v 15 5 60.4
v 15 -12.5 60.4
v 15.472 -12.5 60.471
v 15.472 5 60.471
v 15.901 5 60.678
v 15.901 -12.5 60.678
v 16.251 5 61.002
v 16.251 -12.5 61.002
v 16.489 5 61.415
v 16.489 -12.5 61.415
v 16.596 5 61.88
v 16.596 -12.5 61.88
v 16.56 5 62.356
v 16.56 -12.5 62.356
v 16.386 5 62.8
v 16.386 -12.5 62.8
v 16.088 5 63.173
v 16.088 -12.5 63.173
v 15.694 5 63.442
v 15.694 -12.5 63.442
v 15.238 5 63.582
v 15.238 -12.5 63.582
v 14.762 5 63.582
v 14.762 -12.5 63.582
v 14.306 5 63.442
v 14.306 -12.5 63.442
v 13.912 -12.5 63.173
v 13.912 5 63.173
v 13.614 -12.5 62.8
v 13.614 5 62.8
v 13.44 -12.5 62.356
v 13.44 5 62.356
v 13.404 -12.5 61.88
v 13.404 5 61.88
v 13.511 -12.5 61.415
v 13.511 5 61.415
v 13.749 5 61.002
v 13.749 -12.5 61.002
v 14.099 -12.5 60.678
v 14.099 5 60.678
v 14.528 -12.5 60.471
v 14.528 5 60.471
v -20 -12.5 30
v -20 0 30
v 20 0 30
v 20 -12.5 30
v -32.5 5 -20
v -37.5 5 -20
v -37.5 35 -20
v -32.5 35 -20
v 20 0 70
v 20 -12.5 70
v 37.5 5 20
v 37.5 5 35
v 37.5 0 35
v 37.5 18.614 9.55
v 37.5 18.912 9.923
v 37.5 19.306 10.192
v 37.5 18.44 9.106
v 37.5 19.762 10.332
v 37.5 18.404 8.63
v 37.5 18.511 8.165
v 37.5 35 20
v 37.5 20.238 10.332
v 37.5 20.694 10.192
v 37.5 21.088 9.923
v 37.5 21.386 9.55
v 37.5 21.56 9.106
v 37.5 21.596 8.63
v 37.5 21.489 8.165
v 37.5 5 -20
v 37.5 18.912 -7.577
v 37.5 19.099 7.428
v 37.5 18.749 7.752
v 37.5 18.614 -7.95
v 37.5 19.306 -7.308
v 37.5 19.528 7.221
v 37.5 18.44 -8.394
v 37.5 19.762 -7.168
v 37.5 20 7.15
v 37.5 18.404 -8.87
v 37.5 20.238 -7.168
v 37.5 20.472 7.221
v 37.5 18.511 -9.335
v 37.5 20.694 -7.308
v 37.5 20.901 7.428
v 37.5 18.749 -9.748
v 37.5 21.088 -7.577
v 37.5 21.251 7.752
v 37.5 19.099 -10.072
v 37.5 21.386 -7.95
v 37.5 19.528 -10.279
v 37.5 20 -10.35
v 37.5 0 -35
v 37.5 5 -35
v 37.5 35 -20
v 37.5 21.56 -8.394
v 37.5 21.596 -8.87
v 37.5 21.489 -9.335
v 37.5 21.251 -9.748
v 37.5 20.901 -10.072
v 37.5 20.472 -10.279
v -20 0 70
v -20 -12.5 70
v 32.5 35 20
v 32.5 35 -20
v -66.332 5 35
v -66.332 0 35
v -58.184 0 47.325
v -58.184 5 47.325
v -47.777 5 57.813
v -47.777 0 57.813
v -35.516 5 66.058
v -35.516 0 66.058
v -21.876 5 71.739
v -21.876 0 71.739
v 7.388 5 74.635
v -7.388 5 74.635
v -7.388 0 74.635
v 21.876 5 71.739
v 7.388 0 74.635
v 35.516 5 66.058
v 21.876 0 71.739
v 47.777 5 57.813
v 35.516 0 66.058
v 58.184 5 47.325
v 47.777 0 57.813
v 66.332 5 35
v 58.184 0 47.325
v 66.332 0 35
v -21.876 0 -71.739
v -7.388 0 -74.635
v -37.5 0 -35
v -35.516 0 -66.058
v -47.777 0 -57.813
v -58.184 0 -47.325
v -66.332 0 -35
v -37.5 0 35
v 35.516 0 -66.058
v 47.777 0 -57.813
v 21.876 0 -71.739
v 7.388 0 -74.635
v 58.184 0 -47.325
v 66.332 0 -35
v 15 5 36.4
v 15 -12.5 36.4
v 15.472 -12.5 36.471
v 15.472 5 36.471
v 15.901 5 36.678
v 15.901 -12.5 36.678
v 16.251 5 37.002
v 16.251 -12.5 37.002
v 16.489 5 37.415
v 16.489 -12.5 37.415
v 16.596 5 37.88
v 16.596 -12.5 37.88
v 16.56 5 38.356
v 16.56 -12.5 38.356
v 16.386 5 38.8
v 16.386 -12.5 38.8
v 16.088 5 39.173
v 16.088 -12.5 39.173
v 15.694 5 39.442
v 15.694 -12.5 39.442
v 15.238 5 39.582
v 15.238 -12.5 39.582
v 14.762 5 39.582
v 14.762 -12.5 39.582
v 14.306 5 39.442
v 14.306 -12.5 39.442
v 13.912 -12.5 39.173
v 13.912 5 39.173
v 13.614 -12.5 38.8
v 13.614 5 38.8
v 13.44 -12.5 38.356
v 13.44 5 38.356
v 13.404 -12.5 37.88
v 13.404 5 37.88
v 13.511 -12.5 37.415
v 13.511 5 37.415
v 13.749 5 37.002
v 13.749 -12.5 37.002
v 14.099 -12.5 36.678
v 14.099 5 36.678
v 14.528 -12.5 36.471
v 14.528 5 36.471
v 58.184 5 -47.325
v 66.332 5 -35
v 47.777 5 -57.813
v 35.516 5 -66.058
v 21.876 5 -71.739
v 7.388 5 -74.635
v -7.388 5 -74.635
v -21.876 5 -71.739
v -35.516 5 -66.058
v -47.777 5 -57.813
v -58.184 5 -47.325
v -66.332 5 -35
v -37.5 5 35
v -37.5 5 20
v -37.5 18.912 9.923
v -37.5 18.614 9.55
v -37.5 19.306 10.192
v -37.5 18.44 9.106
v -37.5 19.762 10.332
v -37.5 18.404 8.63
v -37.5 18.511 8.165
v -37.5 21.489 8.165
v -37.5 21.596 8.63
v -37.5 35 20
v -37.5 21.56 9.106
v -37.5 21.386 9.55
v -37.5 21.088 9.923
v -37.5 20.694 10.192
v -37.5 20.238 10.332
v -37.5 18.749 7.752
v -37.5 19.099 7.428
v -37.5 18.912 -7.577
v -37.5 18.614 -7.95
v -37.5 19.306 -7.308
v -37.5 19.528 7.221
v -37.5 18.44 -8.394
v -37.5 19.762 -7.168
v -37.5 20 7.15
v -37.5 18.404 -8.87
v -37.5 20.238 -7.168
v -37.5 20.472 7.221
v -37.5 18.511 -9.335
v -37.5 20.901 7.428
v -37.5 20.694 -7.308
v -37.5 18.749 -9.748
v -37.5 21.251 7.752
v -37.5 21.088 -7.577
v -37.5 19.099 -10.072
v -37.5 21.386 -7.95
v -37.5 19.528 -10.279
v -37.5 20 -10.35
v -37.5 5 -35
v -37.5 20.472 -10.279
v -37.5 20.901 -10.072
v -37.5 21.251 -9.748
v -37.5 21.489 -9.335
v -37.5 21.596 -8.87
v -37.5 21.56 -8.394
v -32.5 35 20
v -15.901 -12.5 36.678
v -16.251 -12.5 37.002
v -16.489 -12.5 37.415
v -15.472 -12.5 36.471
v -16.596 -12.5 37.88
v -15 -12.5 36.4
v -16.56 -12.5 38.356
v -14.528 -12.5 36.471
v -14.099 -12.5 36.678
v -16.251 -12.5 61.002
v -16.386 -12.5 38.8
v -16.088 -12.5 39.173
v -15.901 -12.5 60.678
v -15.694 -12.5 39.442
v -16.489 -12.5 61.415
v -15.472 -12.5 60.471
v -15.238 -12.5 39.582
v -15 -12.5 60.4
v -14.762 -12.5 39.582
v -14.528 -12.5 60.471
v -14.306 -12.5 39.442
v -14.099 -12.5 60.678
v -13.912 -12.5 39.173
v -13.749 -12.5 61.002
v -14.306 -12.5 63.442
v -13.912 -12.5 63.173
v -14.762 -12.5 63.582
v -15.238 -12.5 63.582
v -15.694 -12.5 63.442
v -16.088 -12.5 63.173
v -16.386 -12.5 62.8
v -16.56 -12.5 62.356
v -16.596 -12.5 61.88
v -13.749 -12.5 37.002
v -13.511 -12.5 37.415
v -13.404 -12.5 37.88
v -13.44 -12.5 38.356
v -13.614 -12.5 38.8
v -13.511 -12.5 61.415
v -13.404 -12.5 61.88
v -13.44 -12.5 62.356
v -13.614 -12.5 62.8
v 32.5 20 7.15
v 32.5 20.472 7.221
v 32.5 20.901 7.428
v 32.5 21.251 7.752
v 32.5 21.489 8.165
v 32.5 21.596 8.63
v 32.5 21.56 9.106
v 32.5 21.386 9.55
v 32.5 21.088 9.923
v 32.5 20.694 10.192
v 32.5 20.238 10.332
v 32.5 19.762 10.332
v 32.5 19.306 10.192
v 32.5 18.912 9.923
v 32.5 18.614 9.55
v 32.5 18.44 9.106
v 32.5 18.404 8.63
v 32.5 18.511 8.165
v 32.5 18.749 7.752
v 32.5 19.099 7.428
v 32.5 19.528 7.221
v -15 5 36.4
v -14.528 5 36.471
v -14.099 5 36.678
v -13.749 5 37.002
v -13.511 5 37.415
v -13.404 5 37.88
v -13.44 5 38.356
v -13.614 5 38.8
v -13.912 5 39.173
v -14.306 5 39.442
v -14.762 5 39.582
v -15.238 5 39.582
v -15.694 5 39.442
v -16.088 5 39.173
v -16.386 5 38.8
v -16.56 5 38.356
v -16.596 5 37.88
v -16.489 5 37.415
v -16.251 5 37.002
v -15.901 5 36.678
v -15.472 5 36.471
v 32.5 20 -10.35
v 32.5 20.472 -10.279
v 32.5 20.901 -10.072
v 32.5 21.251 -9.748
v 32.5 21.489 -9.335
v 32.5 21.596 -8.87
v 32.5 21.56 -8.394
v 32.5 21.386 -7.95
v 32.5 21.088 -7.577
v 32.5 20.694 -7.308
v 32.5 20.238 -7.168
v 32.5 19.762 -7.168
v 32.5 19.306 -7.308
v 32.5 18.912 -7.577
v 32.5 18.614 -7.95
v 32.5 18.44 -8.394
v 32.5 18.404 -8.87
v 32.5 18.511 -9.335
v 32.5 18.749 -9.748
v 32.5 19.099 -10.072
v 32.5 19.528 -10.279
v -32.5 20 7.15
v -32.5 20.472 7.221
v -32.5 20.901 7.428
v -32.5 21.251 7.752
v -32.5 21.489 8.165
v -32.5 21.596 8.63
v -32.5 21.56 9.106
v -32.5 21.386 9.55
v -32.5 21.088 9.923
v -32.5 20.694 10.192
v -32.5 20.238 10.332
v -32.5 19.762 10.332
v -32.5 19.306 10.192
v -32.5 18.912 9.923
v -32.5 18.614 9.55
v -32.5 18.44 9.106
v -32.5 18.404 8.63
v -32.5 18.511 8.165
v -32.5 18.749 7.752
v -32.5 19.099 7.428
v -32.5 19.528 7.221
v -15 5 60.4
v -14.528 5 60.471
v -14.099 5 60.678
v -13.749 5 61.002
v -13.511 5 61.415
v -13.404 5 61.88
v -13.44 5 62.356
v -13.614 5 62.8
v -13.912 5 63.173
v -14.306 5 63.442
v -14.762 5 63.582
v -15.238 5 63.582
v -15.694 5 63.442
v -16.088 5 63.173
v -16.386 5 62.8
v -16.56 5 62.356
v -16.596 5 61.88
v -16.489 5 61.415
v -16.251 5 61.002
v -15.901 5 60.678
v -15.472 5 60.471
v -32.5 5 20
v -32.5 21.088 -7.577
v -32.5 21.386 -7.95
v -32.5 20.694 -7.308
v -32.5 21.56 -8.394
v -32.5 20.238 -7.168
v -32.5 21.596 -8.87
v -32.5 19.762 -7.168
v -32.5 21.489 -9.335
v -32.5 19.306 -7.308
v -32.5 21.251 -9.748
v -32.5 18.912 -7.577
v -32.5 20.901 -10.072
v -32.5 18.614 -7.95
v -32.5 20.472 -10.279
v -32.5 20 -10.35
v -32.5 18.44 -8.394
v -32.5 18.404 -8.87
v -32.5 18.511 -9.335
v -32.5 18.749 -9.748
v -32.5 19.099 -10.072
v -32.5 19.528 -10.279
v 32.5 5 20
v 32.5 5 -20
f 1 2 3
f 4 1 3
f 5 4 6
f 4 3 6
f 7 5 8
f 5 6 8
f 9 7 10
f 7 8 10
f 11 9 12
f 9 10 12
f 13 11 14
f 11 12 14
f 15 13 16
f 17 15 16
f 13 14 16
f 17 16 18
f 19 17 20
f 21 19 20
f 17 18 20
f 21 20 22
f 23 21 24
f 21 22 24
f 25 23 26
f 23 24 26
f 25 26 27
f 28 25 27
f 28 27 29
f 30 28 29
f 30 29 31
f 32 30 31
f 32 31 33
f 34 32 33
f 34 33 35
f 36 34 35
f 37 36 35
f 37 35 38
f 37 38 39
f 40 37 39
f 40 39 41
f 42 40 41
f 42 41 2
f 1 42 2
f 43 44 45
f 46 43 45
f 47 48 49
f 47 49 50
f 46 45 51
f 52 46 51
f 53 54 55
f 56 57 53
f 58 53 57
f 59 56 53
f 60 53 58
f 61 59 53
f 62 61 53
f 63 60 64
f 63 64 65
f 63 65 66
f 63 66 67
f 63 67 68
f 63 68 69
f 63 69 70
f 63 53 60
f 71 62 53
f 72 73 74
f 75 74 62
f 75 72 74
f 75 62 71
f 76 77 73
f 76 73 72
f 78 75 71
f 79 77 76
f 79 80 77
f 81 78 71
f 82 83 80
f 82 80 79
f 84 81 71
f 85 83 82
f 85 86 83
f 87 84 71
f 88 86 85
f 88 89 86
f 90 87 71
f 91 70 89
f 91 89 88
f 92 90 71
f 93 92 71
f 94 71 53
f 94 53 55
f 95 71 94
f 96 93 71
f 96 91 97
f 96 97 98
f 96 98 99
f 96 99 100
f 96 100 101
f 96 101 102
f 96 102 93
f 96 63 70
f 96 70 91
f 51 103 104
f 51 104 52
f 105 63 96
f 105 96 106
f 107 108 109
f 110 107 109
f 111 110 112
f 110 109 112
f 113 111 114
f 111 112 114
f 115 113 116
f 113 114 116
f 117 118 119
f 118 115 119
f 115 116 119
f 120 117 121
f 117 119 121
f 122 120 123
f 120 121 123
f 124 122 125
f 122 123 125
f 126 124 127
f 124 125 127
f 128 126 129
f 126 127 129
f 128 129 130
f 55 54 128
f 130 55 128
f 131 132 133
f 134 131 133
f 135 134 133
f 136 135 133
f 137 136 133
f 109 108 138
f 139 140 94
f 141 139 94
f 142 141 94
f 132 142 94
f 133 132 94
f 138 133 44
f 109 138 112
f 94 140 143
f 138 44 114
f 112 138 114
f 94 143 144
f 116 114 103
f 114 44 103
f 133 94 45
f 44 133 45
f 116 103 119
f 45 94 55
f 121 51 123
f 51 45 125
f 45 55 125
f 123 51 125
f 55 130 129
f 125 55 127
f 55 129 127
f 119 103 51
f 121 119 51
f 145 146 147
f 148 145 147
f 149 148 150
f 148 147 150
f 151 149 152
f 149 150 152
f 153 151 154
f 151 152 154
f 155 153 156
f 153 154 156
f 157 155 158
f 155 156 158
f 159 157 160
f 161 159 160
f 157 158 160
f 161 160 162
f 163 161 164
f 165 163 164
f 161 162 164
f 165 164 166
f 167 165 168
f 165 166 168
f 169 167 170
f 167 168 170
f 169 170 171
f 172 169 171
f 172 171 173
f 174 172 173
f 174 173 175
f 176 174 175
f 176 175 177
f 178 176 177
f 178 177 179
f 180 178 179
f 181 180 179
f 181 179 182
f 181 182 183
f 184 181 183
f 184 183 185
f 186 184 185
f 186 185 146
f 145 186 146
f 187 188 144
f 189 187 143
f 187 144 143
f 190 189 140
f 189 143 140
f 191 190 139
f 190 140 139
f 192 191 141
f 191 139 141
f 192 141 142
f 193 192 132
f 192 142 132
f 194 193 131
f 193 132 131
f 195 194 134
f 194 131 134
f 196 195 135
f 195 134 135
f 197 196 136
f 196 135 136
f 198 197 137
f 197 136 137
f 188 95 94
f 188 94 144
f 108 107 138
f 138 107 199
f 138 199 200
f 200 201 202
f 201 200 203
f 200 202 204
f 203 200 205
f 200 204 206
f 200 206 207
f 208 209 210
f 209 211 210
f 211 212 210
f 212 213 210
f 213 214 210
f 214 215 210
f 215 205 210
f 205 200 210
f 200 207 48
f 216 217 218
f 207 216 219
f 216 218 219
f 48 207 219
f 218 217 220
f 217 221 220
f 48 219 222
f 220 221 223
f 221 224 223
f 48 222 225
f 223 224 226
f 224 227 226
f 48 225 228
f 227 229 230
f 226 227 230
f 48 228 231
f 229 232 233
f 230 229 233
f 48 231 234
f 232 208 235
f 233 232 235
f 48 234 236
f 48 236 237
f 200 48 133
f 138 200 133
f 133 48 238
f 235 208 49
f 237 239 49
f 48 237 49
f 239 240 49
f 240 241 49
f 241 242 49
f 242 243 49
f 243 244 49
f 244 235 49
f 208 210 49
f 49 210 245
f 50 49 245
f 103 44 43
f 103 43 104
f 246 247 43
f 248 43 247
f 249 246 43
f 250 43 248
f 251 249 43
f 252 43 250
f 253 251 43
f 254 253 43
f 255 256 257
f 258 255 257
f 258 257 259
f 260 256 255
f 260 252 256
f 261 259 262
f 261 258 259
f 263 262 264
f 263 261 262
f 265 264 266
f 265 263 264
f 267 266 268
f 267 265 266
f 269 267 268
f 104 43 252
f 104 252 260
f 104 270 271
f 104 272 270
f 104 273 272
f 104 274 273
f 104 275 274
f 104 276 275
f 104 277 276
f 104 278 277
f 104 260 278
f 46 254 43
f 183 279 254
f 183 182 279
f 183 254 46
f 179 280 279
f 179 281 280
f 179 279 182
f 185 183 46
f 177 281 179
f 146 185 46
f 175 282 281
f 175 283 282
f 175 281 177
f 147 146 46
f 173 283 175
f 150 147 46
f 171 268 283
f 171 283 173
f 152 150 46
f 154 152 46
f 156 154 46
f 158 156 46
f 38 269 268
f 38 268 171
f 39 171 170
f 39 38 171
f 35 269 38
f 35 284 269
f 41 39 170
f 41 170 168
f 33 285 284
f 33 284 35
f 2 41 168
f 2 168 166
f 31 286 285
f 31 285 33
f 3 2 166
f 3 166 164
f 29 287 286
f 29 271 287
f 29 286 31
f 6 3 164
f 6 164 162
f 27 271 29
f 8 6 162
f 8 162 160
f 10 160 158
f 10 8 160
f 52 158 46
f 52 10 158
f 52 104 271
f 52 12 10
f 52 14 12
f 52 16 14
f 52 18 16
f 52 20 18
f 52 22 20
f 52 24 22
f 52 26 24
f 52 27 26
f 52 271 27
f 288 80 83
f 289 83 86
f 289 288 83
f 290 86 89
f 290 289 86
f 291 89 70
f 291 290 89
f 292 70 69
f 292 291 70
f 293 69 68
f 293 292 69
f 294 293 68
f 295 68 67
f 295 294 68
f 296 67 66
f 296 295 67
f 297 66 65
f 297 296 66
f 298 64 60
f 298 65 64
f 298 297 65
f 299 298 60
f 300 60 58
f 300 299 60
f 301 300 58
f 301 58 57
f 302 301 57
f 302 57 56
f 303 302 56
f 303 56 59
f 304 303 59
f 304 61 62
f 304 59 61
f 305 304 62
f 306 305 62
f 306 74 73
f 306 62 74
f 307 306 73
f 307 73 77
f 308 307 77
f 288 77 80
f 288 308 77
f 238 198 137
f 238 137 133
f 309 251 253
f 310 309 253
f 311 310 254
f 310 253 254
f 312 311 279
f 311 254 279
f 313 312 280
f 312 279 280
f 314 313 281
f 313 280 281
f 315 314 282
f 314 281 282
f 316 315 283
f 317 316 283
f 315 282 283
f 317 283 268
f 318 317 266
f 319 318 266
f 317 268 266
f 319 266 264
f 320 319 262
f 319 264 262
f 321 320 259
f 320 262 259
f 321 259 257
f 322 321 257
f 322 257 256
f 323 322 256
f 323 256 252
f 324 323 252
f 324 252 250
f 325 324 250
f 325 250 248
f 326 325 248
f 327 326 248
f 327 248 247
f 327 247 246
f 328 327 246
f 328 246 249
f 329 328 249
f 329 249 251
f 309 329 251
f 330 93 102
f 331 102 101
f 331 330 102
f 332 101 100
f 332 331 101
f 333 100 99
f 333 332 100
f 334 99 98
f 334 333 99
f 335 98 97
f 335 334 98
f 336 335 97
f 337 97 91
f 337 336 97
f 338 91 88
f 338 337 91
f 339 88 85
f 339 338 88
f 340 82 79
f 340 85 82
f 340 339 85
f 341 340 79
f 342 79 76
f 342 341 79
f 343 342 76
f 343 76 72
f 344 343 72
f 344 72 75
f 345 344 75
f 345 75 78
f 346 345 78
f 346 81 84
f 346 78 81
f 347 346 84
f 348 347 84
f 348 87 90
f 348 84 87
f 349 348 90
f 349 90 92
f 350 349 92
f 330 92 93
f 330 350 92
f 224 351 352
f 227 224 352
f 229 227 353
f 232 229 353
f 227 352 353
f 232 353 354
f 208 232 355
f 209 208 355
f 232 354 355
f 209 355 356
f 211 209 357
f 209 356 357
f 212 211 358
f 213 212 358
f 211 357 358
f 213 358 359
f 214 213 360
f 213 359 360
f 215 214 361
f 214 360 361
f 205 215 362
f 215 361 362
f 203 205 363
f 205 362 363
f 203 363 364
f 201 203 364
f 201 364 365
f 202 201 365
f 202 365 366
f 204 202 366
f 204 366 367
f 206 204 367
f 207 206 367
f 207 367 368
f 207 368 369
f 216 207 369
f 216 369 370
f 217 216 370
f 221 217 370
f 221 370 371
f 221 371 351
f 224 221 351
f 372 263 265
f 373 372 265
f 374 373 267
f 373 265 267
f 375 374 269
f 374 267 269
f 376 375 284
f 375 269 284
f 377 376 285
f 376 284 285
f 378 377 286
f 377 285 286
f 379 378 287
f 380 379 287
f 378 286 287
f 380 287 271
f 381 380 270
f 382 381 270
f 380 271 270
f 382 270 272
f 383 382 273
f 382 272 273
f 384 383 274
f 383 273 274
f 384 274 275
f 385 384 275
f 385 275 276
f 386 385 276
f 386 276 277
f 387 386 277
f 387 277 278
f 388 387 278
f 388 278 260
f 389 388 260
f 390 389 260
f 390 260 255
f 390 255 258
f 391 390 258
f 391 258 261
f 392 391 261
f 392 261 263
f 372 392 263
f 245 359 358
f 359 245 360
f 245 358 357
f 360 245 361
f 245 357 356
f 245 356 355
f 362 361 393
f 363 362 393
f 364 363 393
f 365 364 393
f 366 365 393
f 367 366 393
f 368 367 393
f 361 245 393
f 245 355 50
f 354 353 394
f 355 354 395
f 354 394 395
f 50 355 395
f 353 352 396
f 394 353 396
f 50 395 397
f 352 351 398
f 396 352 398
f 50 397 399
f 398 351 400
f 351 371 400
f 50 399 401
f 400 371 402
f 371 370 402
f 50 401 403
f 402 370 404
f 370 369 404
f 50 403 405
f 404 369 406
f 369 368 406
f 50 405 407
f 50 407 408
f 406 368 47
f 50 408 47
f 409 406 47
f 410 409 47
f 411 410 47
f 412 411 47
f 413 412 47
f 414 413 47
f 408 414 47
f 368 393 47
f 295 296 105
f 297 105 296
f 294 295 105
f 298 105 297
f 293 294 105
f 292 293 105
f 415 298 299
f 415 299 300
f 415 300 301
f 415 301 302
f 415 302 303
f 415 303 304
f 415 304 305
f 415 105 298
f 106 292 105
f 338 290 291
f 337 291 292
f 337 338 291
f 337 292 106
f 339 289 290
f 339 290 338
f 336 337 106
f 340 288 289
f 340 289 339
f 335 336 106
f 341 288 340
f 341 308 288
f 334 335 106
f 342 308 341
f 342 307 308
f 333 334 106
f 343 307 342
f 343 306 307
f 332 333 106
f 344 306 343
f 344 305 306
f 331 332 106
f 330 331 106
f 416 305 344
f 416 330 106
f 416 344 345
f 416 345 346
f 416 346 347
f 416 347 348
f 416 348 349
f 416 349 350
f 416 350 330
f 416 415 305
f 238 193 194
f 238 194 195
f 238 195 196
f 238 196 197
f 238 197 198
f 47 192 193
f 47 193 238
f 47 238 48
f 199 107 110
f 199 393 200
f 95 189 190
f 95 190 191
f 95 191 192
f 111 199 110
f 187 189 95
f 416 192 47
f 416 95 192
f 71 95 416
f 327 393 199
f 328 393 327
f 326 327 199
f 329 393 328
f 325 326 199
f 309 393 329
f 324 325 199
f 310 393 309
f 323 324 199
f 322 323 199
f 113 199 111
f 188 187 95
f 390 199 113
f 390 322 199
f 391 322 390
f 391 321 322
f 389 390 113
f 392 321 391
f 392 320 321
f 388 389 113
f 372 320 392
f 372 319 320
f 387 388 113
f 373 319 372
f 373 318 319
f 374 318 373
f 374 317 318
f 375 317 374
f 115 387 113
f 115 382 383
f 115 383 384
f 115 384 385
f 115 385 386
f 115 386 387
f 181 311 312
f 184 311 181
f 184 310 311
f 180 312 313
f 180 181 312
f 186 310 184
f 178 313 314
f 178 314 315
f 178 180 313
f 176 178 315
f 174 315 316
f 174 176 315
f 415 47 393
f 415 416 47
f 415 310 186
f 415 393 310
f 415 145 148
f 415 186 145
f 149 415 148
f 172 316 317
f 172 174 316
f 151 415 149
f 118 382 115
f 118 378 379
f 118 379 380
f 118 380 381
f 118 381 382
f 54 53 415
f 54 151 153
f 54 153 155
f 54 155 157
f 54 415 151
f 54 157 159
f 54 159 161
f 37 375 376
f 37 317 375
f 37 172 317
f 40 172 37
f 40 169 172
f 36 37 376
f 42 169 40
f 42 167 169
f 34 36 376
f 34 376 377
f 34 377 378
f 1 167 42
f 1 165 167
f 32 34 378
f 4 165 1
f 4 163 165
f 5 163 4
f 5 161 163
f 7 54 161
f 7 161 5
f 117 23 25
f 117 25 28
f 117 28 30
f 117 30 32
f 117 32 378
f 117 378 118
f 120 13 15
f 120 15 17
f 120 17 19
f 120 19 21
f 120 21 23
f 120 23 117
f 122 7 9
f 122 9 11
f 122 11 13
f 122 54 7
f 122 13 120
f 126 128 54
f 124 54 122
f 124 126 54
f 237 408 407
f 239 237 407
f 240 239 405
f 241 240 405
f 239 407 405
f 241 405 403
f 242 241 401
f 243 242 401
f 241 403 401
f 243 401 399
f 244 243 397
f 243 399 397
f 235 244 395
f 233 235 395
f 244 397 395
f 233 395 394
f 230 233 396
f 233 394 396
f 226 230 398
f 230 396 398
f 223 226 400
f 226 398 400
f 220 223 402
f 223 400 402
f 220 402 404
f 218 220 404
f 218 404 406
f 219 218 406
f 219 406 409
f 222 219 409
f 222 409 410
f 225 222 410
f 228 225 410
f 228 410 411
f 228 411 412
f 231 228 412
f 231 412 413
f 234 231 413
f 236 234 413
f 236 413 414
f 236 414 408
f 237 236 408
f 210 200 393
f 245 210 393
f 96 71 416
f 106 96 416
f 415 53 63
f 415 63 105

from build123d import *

# Parameters (mm, degrees)
SKETCH1_R           = 75
BOSS_EXTRUDE2_DEPTH = 5
SKETCH5_W           = 35
SKETCH5_H           = 70
CUT_EXTRUDE1_DEPTH  = 107.183802908
SKETCH6_W           = 5
SKETCH6_H           = 40
BOSS_EXTRUDE3_DEPTH = 30
SKETCH7_R           = 1.6
CUT_EXTRUDE2_DEPTH  = 136.669635512
SKETCH8_W           = 40
SKETCH8_H           = 40
BOSS_EXTRUDE5_DEPTH = 12.5
SKETCH9_R           = 1.6
CUT_EXTRUDE3_DEPTH  = 111.820801297


with BuildPart() as part:
    # Sketch1 → Boss-Extrude2 (new body)
    with BuildSketch(Plane(origin=(0, 0, 0), x_dir=(1, 0, 0), z_dir=(0, 1, 0))):
        with Locations(Location((0, 0, 0), (0, 0, 270))):
            Circle(SKETCH1_R)
    extrude(amount=BOSS_EXTRUDE2_DEPTH)

    # Sketch5 → Cut-Extrude1 (cut, through all)
    with BuildSketch(Plane(origin=(0, 5, 0), x_dir=(1, 0, 0), z_dir=(0, 1, 0))):
        with Locations((55, 0)):
            Rectangle(SKETCH5_W, SKETCH5_H)
        with Locations((-55, 0)):
            Rectangle(SKETCH5_W, SKETCH5_H)
    extrude(amount=-CUT_EXTRUDE1_DEPTH, mode=Mode.SUBTRACT)


with BuildPart() as cut_extrude1_piece_1:
    # of the separate pieces the step leaves, piece 1, a body of its own (cut_extrude1_pieces)
    add(part.part.solids().sort_by_distance((-66.332495807, 0, 35))[0])

    # Sketch6 → Boss-Extrude3 (add)
    with BuildSketch(Plane(origin=(0, 5, 0), x_dir=(1, 0, 0), z_dir=(0, 1, 0))):
        with Locations((-35, 0)):
            Rectangle(SKETCH6_W, SKETCH6_H)
    boss_extrude3 = extrude(amount=BOSS_EXTRUDE3_DEPTH)

    # Sketch7 → Cut-Extrude2 (cut, through all)
    with BuildSketch(Plane(origin=(-32.5, 0, 0), x_dir=(0, 0, -1), z_dir=(1, 0, 0))):
        with Locations((-8.75, 20)):
            Circle(SKETCH7_R)
        with Locations((8.75, 20)):
            Circle(SKETCH7_R)
    cut_extrude2 = extrude(amount=-CUT_EXTRUDE2_DEPTH, mode=Mode.SUBTRACT)

    # Mirror1: Boss-Extrude3, Cut-Extrude2 across plane
    add(boss_extrude3.mirror(Plane(origin=(0, 0, 0), x_dir=(0, 0, 1), z_dir=(1, 0, 0))))
    add(cut_extrude2.mirror(Plane(origin=(0, 0, 0), x_dir=(0, 0, 1), z_dir=(1, 0, 0))), mode=Mode.SUBTRACT)

    # Sketch8 → Boss-Extrude5 (add)
    with BuildSketch(Plane.XZ):
        with Locations((0, 50)):
            Rectangle(SKETCH8_W, SKETCH8_H)
    extrude(amount=BOSS_EXTRUDE5_DEPTH)

    # Sketch9 → Cut-Extrude3 (cut, through all)
    with BuildSketch(Plane.XZ.offset(12.5)):
        with Locations(Location((-15, 62, 0), (0, 0, 270))):
            Circle(SKETCH9_R)
        with Locations(Location((15, 62, 0), (0, 0, 270))):
            Circle(SKETCH9_R)
        with Locations(Location((-15, 38, 0), (0, 0, 270))):
            Circle(SKETCH9_R)
        with Locations(Location((15, 38, 0), (0, 0, 270))):
            Circle(SKETCH9_R)
    extrude(amount=-CUT_EXTRUDE3_DEPTH, mode=Mode.SUBTRACT)


with BuildPart() as cut_extrude1_piece_2:
    # of the separate pieces the step leaves, piece 2, a body of its own (cut_extrude1_pieces)
    add(part.part.solids().sort_by_distance((-72.5, 0, -19.20286437))[0])


with BuildPart() as cut_extrude1_piece_3:
    # of the separate pieces the step leaves, piece 3, a body of its own (cut_extrude1_pieces)
    add(part.part.solids().sort_by_distance((72.5, 0, 19.20286437))[0])


solid = cut_extrude1_piece_1.part
